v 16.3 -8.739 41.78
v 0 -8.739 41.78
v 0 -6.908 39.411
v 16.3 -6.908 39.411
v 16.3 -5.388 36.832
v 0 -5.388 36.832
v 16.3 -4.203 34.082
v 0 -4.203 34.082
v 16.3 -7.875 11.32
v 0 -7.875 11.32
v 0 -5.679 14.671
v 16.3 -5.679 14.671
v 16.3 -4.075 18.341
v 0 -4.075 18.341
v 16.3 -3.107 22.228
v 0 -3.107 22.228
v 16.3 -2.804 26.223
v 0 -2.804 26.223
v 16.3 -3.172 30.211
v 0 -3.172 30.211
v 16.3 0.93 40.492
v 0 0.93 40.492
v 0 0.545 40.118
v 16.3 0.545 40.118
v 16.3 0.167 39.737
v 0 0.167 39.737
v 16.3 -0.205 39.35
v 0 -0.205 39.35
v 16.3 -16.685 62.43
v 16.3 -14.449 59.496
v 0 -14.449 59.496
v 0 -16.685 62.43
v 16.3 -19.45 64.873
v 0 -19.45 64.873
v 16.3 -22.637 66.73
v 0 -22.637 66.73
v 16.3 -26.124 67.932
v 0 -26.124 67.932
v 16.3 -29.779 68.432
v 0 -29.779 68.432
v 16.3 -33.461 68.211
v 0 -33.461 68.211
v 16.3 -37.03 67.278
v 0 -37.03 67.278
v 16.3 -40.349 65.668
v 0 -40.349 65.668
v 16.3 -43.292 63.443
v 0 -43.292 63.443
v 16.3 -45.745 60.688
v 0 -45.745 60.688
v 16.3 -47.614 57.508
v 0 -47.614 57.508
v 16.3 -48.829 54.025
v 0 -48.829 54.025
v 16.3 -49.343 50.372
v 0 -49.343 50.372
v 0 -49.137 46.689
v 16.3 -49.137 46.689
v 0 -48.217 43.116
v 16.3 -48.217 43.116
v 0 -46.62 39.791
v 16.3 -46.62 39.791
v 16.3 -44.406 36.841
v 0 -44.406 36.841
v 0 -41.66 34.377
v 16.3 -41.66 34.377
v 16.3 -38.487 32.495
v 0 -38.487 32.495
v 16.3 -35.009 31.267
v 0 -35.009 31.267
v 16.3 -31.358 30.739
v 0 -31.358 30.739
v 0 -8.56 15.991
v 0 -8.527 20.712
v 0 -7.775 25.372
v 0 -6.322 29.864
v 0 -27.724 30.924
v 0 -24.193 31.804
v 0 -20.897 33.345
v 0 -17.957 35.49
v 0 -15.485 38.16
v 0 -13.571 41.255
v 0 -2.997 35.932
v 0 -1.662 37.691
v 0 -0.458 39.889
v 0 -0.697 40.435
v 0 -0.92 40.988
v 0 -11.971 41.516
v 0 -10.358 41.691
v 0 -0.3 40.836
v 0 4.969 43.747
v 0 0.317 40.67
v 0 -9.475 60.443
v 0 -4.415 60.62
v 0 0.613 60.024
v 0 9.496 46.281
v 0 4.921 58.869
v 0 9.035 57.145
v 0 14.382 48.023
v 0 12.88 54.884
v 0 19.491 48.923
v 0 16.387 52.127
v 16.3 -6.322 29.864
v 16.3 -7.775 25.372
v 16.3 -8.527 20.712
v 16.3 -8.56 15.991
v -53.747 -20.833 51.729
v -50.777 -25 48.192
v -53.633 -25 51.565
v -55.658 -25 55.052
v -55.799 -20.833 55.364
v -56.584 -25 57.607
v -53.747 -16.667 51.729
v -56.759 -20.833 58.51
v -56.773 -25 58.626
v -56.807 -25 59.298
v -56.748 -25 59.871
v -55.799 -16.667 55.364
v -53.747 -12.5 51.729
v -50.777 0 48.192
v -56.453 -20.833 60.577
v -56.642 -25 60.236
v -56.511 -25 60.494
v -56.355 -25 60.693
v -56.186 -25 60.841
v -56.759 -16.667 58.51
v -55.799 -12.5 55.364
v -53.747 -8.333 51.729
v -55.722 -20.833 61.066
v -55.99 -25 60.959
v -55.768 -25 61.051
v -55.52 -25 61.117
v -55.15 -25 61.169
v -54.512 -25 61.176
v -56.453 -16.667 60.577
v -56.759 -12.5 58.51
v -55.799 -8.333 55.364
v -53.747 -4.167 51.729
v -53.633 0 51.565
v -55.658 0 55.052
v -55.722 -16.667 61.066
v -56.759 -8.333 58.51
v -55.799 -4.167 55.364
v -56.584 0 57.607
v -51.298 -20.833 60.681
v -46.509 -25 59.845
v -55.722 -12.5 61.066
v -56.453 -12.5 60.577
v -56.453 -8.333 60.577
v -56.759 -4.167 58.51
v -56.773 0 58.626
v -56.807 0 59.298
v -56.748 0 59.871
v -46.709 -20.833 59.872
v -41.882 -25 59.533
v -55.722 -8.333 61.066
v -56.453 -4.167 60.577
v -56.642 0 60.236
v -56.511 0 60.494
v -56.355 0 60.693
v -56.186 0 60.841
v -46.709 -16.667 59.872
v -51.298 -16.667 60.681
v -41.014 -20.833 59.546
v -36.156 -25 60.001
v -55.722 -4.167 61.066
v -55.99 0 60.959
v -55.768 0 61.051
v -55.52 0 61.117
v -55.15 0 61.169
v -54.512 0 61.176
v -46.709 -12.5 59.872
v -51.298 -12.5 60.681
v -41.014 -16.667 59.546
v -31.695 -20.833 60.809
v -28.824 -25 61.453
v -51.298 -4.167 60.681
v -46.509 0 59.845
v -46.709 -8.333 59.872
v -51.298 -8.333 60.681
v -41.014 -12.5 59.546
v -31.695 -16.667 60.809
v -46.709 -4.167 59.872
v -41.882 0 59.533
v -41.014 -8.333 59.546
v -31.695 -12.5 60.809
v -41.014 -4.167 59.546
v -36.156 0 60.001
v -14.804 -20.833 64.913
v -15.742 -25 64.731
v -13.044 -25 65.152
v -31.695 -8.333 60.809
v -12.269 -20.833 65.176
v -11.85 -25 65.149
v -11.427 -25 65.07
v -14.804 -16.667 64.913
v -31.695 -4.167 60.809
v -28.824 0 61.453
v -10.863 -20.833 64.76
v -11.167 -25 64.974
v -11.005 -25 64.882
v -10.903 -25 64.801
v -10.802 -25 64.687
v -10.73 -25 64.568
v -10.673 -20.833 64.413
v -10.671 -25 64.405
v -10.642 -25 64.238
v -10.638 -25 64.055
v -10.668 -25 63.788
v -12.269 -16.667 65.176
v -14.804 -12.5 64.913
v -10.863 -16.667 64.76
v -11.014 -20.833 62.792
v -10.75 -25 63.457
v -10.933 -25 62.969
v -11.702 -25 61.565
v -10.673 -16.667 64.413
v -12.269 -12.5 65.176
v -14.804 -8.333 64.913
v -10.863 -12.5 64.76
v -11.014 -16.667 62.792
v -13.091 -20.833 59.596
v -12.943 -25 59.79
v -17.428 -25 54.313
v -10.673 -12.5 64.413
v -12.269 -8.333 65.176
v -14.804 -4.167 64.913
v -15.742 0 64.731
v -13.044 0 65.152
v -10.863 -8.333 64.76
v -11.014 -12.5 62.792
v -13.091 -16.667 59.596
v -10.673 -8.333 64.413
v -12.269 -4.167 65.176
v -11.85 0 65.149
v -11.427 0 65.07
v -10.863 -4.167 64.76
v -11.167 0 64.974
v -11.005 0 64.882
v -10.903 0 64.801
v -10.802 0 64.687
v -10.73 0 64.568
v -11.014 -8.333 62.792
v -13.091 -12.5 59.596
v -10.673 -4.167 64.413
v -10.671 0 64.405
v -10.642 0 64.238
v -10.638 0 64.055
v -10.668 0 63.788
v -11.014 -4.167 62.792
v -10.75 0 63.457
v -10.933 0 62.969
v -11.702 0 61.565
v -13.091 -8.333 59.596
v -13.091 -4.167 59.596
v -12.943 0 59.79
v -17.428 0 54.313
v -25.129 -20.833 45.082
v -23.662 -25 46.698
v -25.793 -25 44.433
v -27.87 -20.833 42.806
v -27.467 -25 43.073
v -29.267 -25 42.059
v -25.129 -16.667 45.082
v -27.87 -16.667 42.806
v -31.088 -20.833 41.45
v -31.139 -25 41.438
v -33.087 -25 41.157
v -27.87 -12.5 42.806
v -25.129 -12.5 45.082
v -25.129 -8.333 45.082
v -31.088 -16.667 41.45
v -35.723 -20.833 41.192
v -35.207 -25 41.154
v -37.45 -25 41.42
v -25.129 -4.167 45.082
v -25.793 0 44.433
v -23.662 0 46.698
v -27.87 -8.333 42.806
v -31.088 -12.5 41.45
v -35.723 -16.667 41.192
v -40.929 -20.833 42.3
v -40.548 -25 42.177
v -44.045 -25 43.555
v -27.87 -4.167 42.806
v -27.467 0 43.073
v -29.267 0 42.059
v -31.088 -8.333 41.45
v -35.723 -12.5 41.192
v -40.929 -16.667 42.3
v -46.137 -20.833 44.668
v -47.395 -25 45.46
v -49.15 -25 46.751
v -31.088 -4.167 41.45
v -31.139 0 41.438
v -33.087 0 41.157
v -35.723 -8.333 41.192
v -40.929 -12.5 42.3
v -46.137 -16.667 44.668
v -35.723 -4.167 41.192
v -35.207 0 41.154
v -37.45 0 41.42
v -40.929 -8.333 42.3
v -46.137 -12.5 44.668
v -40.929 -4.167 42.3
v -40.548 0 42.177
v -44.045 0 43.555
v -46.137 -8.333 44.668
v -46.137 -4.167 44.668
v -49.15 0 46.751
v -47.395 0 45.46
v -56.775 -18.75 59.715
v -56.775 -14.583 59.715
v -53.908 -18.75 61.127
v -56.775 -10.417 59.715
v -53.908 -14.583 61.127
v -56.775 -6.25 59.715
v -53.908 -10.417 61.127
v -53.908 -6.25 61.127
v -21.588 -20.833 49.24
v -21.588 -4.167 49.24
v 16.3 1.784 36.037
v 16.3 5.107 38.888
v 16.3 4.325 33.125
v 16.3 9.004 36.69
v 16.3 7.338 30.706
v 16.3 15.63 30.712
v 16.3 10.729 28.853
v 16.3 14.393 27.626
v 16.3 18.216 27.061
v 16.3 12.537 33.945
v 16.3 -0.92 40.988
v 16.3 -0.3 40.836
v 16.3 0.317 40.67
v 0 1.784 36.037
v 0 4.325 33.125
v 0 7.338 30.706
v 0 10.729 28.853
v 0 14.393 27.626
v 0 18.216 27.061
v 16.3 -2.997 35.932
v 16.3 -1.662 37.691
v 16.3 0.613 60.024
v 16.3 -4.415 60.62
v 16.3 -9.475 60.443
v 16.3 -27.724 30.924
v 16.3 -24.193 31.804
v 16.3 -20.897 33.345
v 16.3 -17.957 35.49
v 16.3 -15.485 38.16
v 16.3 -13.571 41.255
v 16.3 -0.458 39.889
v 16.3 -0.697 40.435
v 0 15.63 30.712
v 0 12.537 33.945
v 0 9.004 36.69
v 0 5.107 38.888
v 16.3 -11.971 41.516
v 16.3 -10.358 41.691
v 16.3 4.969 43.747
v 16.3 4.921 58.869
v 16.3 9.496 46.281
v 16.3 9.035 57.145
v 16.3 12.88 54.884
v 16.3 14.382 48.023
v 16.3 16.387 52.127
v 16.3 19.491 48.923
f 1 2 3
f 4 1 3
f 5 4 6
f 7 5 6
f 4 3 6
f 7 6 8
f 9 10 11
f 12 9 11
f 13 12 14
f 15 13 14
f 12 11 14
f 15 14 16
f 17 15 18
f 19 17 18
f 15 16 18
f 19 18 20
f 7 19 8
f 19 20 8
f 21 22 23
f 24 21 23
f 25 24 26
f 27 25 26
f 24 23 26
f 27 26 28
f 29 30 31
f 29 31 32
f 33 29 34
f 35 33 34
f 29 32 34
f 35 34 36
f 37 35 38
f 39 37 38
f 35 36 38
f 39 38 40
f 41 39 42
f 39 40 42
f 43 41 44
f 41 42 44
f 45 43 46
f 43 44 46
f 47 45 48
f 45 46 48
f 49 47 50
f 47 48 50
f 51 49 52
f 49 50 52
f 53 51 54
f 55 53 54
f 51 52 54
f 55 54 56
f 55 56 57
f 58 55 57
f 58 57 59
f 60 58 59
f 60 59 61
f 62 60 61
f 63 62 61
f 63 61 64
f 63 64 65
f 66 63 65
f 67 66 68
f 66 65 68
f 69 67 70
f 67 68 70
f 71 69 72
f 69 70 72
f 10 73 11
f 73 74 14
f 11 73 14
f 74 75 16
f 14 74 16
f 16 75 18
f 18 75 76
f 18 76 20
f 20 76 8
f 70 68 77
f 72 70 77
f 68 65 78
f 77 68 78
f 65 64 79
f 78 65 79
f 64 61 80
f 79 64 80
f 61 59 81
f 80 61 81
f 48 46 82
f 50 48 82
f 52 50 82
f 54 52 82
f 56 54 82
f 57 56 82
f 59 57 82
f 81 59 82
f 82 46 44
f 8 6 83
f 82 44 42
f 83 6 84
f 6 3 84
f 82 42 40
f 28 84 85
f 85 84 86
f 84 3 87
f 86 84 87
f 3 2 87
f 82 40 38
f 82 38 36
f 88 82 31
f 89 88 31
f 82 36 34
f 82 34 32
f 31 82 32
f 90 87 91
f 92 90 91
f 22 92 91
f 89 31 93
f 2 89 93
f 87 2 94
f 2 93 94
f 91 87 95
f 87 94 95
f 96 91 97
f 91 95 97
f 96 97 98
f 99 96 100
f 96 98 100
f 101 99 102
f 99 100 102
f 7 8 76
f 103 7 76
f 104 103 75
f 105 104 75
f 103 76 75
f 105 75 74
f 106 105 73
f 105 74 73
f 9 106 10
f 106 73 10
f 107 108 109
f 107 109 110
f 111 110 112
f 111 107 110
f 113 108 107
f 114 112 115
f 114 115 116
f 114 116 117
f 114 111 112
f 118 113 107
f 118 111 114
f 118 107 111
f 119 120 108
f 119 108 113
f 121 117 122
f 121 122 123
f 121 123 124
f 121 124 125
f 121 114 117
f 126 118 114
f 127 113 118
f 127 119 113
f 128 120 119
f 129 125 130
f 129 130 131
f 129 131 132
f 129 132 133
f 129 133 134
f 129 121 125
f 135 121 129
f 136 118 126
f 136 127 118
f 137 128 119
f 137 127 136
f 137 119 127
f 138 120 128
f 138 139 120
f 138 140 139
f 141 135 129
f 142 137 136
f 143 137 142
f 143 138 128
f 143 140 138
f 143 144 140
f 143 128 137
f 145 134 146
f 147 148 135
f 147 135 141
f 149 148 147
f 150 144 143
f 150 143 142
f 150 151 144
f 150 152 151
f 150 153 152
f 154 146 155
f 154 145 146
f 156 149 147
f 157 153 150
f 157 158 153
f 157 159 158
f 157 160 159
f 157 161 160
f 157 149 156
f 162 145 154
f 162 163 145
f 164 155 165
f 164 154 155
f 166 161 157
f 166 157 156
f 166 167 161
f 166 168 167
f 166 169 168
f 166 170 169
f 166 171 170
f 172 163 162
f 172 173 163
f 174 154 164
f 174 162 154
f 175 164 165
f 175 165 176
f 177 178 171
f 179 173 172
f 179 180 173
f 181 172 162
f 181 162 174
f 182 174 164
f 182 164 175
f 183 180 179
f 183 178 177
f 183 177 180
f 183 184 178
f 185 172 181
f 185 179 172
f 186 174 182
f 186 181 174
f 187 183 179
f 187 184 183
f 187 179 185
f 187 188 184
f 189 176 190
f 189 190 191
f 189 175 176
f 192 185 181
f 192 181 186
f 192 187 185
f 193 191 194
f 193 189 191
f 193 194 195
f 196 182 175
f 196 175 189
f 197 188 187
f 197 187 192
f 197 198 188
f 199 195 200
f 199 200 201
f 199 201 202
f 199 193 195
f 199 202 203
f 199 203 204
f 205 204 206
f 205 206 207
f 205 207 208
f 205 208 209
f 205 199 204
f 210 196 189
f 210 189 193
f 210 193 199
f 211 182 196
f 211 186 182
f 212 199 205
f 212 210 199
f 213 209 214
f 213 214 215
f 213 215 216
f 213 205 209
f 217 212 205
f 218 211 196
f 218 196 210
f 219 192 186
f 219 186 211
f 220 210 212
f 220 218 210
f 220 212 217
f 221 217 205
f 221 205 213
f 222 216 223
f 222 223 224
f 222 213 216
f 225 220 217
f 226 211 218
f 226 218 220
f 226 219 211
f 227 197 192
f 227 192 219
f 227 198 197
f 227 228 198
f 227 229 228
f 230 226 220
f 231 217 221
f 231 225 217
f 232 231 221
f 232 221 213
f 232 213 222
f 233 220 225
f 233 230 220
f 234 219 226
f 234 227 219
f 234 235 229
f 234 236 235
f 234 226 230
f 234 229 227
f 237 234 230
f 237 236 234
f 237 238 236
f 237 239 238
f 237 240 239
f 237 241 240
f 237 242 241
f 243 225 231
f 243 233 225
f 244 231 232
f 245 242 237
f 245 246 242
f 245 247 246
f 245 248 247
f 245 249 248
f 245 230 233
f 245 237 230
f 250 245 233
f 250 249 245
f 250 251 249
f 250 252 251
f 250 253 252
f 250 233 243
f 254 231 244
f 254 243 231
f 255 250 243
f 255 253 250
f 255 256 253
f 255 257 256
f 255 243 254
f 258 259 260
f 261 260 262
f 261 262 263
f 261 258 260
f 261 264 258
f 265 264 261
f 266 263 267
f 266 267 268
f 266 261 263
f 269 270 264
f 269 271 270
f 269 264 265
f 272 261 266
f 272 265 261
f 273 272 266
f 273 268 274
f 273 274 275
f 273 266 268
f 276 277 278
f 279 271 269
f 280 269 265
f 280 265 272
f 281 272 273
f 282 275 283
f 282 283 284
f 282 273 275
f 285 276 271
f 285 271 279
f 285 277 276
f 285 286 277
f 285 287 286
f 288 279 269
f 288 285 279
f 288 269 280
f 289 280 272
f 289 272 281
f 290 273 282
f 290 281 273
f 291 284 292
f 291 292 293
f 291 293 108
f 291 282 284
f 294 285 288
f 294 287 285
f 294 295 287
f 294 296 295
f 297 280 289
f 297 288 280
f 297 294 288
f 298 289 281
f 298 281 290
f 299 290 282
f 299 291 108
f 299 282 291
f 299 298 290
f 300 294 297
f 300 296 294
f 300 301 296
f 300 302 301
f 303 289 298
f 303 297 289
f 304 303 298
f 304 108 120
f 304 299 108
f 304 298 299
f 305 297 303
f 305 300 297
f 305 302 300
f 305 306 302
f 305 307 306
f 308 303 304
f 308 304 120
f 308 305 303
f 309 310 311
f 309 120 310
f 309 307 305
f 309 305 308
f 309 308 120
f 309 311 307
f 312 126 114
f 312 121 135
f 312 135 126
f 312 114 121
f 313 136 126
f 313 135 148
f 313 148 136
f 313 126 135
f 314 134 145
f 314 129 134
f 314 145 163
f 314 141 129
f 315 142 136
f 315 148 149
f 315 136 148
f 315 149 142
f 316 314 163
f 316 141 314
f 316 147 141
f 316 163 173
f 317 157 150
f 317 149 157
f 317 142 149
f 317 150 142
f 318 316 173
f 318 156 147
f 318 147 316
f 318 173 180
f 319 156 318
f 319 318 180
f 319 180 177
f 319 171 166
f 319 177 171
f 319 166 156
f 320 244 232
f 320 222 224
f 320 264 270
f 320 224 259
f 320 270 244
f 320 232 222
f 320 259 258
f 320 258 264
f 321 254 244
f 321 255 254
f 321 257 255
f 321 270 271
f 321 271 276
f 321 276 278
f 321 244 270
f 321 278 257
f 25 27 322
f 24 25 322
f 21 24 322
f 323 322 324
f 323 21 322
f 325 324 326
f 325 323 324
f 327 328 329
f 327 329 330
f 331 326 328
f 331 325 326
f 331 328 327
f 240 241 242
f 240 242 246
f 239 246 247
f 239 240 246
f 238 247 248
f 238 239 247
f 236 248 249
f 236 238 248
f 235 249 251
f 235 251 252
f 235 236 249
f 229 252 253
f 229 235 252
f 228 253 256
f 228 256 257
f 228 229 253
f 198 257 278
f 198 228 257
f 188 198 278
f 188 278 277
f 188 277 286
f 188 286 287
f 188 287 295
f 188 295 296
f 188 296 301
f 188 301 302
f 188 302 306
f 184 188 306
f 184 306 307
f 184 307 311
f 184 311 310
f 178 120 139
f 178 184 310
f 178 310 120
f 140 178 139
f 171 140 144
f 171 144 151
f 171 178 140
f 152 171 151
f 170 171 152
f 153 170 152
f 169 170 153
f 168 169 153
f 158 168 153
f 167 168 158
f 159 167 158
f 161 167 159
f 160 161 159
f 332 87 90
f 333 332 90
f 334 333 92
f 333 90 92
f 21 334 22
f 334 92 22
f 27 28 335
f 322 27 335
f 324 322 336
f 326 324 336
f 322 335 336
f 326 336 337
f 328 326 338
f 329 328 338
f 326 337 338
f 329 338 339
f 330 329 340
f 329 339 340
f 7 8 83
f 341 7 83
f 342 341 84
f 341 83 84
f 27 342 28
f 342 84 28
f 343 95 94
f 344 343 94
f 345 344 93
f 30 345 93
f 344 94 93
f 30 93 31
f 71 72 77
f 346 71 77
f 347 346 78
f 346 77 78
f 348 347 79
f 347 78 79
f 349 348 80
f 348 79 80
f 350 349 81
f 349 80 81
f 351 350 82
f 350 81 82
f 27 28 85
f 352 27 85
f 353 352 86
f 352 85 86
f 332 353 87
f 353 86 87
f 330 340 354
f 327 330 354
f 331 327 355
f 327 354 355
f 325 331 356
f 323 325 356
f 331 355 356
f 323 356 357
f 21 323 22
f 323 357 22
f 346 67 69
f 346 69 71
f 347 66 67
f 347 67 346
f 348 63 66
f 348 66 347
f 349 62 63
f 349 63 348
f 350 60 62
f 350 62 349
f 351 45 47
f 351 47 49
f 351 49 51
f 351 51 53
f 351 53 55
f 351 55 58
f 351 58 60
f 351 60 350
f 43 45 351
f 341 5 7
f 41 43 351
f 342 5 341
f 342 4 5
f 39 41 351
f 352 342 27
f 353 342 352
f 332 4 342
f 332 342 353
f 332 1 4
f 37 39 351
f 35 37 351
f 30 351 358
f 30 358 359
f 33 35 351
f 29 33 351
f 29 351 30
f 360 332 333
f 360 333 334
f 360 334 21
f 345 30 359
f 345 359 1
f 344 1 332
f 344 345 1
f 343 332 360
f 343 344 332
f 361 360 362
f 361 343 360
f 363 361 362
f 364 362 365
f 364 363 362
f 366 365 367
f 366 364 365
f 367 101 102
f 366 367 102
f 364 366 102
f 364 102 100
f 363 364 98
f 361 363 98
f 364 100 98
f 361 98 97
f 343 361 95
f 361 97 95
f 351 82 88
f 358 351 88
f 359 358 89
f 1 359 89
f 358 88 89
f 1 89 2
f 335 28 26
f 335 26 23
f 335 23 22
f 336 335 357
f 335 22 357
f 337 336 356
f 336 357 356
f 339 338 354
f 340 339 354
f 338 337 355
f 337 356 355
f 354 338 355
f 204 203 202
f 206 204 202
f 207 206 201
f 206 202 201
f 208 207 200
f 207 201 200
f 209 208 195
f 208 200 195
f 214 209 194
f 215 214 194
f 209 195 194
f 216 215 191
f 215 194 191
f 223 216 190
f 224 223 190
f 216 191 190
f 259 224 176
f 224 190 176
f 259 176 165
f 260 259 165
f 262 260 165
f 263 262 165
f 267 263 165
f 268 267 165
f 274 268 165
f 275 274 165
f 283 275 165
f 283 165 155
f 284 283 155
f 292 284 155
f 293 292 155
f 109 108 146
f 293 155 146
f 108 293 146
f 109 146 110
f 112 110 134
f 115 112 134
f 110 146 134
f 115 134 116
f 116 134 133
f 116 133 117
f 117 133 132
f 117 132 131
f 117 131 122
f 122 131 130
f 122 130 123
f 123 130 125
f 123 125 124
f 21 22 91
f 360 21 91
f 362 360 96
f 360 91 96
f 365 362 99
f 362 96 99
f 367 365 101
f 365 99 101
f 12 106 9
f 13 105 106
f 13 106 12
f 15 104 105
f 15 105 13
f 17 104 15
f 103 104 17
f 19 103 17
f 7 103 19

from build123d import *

# Parameters (mm, degrees)
F1_DEPTH = 16.3
F3_DEPTH = 25


with BuildPart() as f1:
    # F0 (on Right) → F1 (new body)
    with BuildSketch(Plane.YZ):
        with BuildLine():
            ThreePointArc((-12.1971222107, 45.0054410083), (-11.7748566709, 47.2766931346), (-11.6333942401, 49.5825298131))
            ThreePointArc((-11.6333942401, 49.5825298131), (-12.3508619293, 54.7354751662), (-14.44868705, 59.4964346767))
            ThreePointArc((-14.44868705, 59.4964346767), (-23.1935215297, 55.7063236123), (-30.496686697, 49.5825298131))
            ThreePointArc((-30.496686697, 49.5825298131), (-20.8754452172, 49.1789168751), (-12.1971222107, 45.0054410083))
        make_face()
        with BuildLine():
            ThreePointArc((-14.44868705, 59.4964346767), (-12.3508619293, 54.7354751662), (-11.6333942401, 49.5825298131))
            ThreePointArc((-11.6333942401, 49.5825298131), (-11.7748566709, 47.2766931346), (-12.1971222107, 45.0054410083))
            ThreePointArc((-12.1971222107, 45.0054410083), (-10.3881149892, 43.4784974996), (-8.7393013606, 41.7798282486))
            ThreePointArc((-8.7393013606, 41.7798282486), (-4.8040885537, 41.6369515569), (-0.9201595956, 40.987790996))
            ThreePointArc((-0.9201595956, 40.987790996), (-2.3378643948, 50.6817460292), (0.6132117717, 60.0237908024))
            ThreePointArc((0.6132117717, 60.0237908024), (-6.9481373655, 60.6283639636), (-14.44868705, 59.4964346767))
        make_face()
        with BuildLine():
            ThreePointArc((-30.496686697, 49.5825298131), (-23.1935215297, 55.7063236123), (-14.44868705, 59.4964346767))
            ThreePointArc((-14.44868705, 59.4964346767), (-46.7573242092, 59.1436735736), (-31.357916302, 30.7389079244))
            ThreePointArc((-31.357916302, 30.7389079244), (-23.3830823555, 37.5506109415), (-13.5710991485, 41.2549678377))
            ThreePointArc((-13.5710991485, 41.2549678377), (-12.7845624252, 43.0937351564), (-12.1971222107, 45.0054410083))
            ThreePointArc((-12.1971222107, 45.0054410083), (-20.8754452172, 49.1789168751), (-30.496686697, 49.5825298131))
        make_face()
        with BuildLine():
            ThreePointArc((-8.7393013606, 41.7798282486), (-10.3881149892, 43.4784974996), (-12.1971222107, 45.0054410083))
            ThreePointArc((-12.1971222107, 45.0054410083), (-12.7845624252, 43.0937351564), (-13.5710991485, 41.2549678377))
            ThreePointArc((-13.5710991485, 41.2549678377), (-11.1656812919, 41.6138851313), (-8.7393013606, 41.7798282486))
        make_face()
        with BuildLine():
            ThreePointArc((-13.5710991485, 41.2549678377), (-23.3830823555, 37.5506109415), (-31.357916302, 30.7389079244))
            ThreePointArc((-31.357916302, 30.7389079244), (-20.8965420075, 33.3448876118), (-13.5710991485, 41.2549678377))
        make_face()
        with BuildLine():
            ThreePointArc((19.4906238467, 48.9234365523), (10.9960641192, 56.0792416197), (0.6132117717, 60.0237908024))
            ThreePointArc((0.6132117717, 60.0237908024), (-2.3378643948, 50.6817460292), (-0.9201595956, 40.987790996))
            ThreePointArc((-0.9201595956, 40.987790996), (0.0090353267, 40.7544944765), (0.9304370528, 40.4921029198))
            ThreePointArc((0.9304370528, 40.4921029198), (9.4956537387, 46.2814526039), (19.4906238467, 48.9234365523))
        make_face()
        with BuildLine():
            ThreePointArc((-0.9201595956, 40.987790996), (-4.8040885537, 41.6369515569), (-8.7393013606, 41.7798282486))
            ThreePointArc((-8.7393013606, 41.7798282486), (-6.1075185605, 38.1452977309), (-4.2026985521, 34.0823242475))
            ThreePointArc((-4.2026985521, 34.0823242475), (-2.3451015259, 36.82323), (-0.2050463277, 39.3497681066))
            ThreePointArc((-0.2050463277, 39.3497681066), (-0.5793209757, 40.1614809514), (-0.9201595956, 40.987790996))
        make_face()
    extrude(amount=F1_DEPTH)


with BuildPart() as f1b:
    # F0 (on Right) → F1, piece 2 (new body)
    with BuildSketch(Plane.YZ):
        with BuildLine():
            ThreePointArc((-7.8750019893, 11.3203125075), (-3.1073807878, 22.228370486), (-4.2026985521, 34.0823242475))
            ThreePointArc((-4.2026985521, 34.0823242475), (-8.2400086329, 23.0564417081), (-7.8750019893, 11.3203125075))
        make_face()
    extrude(amount=F1_DEPTH)


with BuildPart() as f1c:
    # F0 (on Right) → F1, piece 3 (new body)
    with BuildSketch(Plane.YZ):
        with BuildLine():
            ThreePointArc((-0.2050463277, 39.3497681066), (7.3379322182, 30.7056804526), (18.216154673, 27.0613625553))
            ThreePointArc((18.216154673, 27.0613625553), (10.8209680209, 35.382519762), (0.9304370528, 40.4921029198))
            ThreePointArc((0.9304370528, 40.4921029198), (0.3552553346, 39.9283309178), (-0.2050463277, 39.3497681066))
        make_face()
    extrude(amount=F1_DEPTH)


with BuildPart() as f3:
    # F2 (on Front) → F3 (new body)
    with BuildSketch(Plane.XZ):
        with BuildLine():
            add(Edge.make_bspline(
                [(-50.7769659162, 48.1923893094), (-55.2717001004, 52.5799209169), (-60.455203499, 65.4338519193), (-41.1479753801, 54.8614513769), (-1.0840439012, 71.9976398536), (-21.2575691949, 50.6511793978), (-29.2422220069, 37.8950901924), (-45.221630707, 42.7695527586), (-50.7769659162, 48.1923893094)],
                knots=[0, 0, 0, 0, 0.1441466285, 0.2977703205, 0.5138029535, 0.66851698, 0.8218397779, 1, 1, 1, 1], degree=3))
        make_face()
    extrude(amount=F3_DEPTH)


solid = Compound([f1.part, f1b.part, f1c.part, f3.part])
